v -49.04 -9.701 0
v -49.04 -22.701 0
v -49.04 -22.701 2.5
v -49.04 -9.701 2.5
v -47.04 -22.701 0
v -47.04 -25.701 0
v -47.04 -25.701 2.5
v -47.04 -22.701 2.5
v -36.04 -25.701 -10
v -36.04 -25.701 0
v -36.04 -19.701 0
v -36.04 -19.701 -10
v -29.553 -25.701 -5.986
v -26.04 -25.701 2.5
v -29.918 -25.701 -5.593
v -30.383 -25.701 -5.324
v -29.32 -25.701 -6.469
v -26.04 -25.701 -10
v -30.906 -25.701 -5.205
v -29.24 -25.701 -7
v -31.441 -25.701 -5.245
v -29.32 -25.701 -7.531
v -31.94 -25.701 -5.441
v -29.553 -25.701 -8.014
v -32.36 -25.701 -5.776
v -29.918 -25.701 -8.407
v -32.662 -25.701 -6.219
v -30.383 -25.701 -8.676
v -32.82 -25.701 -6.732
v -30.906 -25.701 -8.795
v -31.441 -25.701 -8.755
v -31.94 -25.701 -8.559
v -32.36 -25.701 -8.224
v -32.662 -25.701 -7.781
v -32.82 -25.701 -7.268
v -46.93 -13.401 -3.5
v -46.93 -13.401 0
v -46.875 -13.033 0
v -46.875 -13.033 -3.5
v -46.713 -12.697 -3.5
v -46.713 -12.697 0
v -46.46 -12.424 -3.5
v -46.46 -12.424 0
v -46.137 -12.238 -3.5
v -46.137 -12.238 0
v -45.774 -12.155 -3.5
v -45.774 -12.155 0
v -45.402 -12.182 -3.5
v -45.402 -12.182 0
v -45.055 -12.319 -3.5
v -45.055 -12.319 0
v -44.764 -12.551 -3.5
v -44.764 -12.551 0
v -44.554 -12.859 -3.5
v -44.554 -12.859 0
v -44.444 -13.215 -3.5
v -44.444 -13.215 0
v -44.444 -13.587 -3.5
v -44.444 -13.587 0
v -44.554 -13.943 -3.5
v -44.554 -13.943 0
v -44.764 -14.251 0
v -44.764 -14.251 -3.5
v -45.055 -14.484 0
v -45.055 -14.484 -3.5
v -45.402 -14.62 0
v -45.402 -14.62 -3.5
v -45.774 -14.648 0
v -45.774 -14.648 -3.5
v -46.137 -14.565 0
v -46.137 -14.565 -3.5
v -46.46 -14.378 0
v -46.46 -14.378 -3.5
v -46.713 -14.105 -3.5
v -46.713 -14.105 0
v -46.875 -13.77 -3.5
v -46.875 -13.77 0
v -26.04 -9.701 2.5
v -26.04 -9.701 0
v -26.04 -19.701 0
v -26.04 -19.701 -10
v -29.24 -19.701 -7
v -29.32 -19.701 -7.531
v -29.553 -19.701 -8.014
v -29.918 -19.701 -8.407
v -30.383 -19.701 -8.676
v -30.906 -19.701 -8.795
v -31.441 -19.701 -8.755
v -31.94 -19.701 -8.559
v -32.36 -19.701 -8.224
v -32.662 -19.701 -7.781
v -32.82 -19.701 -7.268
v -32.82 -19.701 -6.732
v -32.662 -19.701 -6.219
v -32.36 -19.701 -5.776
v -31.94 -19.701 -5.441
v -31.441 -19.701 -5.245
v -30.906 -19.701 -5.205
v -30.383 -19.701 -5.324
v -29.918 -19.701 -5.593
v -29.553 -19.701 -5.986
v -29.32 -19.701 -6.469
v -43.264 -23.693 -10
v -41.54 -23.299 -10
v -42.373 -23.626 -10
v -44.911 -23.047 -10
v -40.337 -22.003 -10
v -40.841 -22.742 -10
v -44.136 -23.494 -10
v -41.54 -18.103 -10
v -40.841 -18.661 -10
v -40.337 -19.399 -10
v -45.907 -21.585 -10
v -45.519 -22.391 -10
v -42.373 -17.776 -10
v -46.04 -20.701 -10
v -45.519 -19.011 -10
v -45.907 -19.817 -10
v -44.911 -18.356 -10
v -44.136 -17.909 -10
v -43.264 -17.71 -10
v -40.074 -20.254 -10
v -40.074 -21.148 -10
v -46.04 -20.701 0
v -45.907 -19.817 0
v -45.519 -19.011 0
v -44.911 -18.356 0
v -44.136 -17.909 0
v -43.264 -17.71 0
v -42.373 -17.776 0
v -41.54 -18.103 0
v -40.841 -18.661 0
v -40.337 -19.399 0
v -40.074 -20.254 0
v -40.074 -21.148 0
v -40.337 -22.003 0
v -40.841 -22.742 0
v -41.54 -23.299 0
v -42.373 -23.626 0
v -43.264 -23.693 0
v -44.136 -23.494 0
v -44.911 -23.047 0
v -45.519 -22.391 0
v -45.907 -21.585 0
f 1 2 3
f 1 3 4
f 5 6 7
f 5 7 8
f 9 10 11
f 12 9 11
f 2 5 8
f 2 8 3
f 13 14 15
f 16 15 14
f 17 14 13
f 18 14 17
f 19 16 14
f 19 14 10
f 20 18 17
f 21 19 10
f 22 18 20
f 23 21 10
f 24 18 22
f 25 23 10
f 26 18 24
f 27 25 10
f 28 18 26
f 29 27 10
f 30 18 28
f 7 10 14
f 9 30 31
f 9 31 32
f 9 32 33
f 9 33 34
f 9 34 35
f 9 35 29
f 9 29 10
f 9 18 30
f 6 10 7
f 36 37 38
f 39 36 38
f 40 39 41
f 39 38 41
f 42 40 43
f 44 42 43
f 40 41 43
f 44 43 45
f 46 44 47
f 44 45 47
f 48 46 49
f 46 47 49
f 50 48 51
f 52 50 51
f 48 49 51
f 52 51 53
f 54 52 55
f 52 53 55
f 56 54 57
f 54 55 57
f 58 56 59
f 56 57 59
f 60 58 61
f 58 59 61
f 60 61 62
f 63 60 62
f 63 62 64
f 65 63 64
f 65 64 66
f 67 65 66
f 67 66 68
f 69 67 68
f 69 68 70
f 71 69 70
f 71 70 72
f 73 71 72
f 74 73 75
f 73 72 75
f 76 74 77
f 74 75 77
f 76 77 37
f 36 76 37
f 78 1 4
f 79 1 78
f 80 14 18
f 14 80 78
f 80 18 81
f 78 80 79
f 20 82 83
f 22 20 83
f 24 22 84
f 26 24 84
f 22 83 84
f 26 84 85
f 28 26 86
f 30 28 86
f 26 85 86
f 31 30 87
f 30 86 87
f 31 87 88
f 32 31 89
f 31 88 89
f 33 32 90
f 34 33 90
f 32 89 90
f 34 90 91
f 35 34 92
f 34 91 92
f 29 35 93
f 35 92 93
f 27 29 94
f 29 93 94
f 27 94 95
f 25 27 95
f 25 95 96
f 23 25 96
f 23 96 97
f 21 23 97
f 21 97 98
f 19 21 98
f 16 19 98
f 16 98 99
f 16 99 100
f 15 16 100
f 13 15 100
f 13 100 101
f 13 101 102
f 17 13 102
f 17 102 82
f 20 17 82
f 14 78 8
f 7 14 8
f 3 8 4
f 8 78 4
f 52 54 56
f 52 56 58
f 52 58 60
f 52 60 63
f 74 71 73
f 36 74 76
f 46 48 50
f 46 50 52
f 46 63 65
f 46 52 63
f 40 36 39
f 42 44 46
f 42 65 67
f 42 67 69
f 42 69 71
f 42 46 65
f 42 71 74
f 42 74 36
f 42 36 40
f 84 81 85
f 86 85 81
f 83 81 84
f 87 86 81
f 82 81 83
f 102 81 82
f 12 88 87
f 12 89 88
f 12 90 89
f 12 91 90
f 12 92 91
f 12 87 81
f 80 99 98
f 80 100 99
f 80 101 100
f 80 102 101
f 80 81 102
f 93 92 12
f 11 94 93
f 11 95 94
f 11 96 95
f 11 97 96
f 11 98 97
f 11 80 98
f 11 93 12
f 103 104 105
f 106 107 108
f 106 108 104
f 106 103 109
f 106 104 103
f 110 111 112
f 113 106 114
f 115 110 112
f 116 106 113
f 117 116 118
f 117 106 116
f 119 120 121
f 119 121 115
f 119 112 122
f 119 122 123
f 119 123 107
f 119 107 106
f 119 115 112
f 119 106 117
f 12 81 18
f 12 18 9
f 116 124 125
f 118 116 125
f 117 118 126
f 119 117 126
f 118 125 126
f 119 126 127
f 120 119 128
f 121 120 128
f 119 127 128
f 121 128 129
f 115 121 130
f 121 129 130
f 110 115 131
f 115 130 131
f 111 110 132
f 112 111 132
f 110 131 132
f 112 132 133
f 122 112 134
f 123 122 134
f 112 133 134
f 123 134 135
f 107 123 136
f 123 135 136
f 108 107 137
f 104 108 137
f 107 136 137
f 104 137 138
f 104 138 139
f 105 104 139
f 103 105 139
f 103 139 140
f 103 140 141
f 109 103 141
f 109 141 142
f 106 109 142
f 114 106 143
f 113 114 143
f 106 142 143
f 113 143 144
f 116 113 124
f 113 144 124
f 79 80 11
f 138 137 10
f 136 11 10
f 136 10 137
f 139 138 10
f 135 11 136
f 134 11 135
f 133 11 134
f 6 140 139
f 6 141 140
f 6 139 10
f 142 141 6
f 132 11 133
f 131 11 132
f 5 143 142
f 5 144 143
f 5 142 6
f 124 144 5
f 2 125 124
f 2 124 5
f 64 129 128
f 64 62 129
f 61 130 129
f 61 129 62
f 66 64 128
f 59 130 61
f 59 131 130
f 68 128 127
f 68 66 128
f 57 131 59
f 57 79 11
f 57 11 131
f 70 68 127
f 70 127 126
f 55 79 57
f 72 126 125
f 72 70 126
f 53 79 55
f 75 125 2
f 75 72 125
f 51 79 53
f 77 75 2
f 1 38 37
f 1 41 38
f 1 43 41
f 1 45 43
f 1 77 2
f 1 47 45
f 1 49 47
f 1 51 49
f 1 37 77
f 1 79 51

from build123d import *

# Parameters (mm, degrees)
BOSS_EXTRUDE1_DEPTH = 2.5
SKETCH2_R           = 1.25
BOSS_EXTRUDE2_DEPTH = 3.5
SKETCH3_R           = 3
BOSS_EXTRUDE3_DEPTH = 10
SKETCH4_W           = 10
SKETCH4_H           = 6
BOSS_EXTRUDE4_DEPTH = 10
SKETCH5_R           = 1.8
CUT_EXTRUDE1_DEPTH  = 7
BOSS_EXTRUDE5_DEPTH = 2.5
SKETCH8_W           = 7
SKETCH8_H           = 30
CUT_EXTRUDE2_DEPTH  = 10
SKETCH9_W           = 15.6
SKETCH9_H           = 14
CUT_EXTRUDE3_DEPTH  = 10
SKETCH10_W          = 2
SKETCH10_H          = 16
CUT_EXTRUDE4_DEPTH  = 10
SKETCH11_R          = 1.25
BOSS_EXTRUDE6_DEPTH = 3.5
SKETCH12_W          = 2
SKETCH12_H          = 3
CUT_EXTRUDE5_DEPTH  = 10


with BuildPart() as part:
    # Sketch1 → Boss-Extrude1 (new body)
    with BuildSketch(Plane.XY):
        Polygon((-47.040141431, -25.701123128), (-19.040141431, -25.701123128), (-19.040141431, 4.298876872), (-29.040141431, 4.298876872), (-47.040141431, -15.701123128), align=None)
    extrude(amount=BOSS_EXTRUDE1_DEPTH)

    # Sketch2 → Boss-Extrude2 (add)
    with BuildSketch(Plane(origin=(0, 0, 0), x_dir=(-1, 0, 0), z_dir=(0, 0, -1))):
        with Locations((23.040141431, -0.081123128)):
            Circle(SKETCH2_R)
    extrude(amount=BOSS_EXTRUDE2_DEPTH)

    # Sketch3 → Boss-Extrude3 (add)
    with BuildSketch(Plane(origin=(0, 0, 0), x_dir=(-1, 0, 0), z_dir=(0, 0, -1))):
        with Locations((43.040141431, -20.701123128)):
            Circle(SKETCH3_R)
    extrude(amount=BOSS_EXTRUDE3_DEPTH)

    # Sketch4 → Boss-Extrude4 (add)
    with BuildSketch(Plane(origin=(0, 0, 0), x_dir=(-1, 0, 0), z_dir=(0, 0, -1))):
        with Locations((31.040141431, -22.701123128)):
            Rectangle(SKETCH4_W, SKETCH4_H)
    extrude(amount=BOSS_EXTRUDE4_DEPTH)

    # Sketch5 → Cut-Extrude1 (cut, through all)
    with BuildSketch(Plane(origin=(0, -19.701123128, 0), x_dir=(1, 0, 0), z_dir=(0, 1, 0))):
        with Locations((-31.040141431, 7)):
            Circle(SKETCH5_R)
    extrude(amount=-CUT_EXTRUDE1_DEPTH, mode=Mode.SUBTRACT)

    # Sketch6 → Boss-Extrude5 (add)
    with BuildSketch(Plane(origin=(0, 0, 0), x_dir=(-1, 0, 0), z_dir=(0, 0, -1))):
        Polygon((47.040141431, -25.701123128), (51.040141431, -25.701123128), (51.040141431, -9.701123128), (41.640141431, -9.701123128), (47.040141431, -15.701123128), align=None)
    extrude(amount=-BOSS_EXTRUDE5_DEPTH)

    # Sketch8 → Cut-Extrude2 (cut)
    with BuildSketch(Plane(origin=(0, 0, -3.5), x_dir=(-1, 0, 0), z_dir=(0, 0, -1))):
        with Locations((22.540141431, -10.701123128)):
            Rectangle(SKETCH8_W, SKETCH8_H)
    extrude(amount=-CUT_EXTRUDE2_DEPTH, mode=Mode.SUBTRACT)

    # Sketch9 → Cut-Extrude3 (cut)
    with BuildSketch(Plane(origin=(0, 0, 0), x_dir=(-1, 0, 0), z_dir=(0, 0, -1))):
        with Locations((33.840141431, -2.701123128)):
            Rectangle(SKETCH9_W, SKETCH9_H)
    extrude(amount=-CUT_EXTRUDE3_DEPTH, mode=Mode.SUBTRACT)

    # Sketch10 → Cut-Extrude4 (cut)
    with BuildSketch(Plane(origin=(0, 0, 0), x_dir=(-1, 0, 0), z_dir=(0, 0, -1))):
        with Locations((50.040141431, -17.701123128)):
            Rectangle(SKETCH10_W, SKETCH10_H)
    extrude(amount=-CUT_EXTRUDE4_DEPTH, mode=Mode.SUBTRACT)

    # Sketch11 → Boss-Extrude6 (add)
    with BuildSketch(Plane(origin=(0, 0, 0), x_dir=(-1, 0, 0), z_dir=(0, 0, -1))):
        with Locations((45.680141431, -13.401123128)):
            Circle(SKETCH11_R)
    extrude(amount=BOSS_EXTRUDE6_DEPTH)

    # Sketch12 → Cut-Extrude5 (cut)
    with BuildSketch(Plane(origin=(0, 0, 0), x_dir=(-1, 0, 0), z_dir=(0, 0, -1))):
        with Locations((48.040141431, -24.201123128)):
            Rectangle(SKETCH12_W, SKETCH12_H)
    extrude(amount=-CUT_EXTRUDE5_DEPTH, mode=Mode.SUBTRACT)


solid = part.part
